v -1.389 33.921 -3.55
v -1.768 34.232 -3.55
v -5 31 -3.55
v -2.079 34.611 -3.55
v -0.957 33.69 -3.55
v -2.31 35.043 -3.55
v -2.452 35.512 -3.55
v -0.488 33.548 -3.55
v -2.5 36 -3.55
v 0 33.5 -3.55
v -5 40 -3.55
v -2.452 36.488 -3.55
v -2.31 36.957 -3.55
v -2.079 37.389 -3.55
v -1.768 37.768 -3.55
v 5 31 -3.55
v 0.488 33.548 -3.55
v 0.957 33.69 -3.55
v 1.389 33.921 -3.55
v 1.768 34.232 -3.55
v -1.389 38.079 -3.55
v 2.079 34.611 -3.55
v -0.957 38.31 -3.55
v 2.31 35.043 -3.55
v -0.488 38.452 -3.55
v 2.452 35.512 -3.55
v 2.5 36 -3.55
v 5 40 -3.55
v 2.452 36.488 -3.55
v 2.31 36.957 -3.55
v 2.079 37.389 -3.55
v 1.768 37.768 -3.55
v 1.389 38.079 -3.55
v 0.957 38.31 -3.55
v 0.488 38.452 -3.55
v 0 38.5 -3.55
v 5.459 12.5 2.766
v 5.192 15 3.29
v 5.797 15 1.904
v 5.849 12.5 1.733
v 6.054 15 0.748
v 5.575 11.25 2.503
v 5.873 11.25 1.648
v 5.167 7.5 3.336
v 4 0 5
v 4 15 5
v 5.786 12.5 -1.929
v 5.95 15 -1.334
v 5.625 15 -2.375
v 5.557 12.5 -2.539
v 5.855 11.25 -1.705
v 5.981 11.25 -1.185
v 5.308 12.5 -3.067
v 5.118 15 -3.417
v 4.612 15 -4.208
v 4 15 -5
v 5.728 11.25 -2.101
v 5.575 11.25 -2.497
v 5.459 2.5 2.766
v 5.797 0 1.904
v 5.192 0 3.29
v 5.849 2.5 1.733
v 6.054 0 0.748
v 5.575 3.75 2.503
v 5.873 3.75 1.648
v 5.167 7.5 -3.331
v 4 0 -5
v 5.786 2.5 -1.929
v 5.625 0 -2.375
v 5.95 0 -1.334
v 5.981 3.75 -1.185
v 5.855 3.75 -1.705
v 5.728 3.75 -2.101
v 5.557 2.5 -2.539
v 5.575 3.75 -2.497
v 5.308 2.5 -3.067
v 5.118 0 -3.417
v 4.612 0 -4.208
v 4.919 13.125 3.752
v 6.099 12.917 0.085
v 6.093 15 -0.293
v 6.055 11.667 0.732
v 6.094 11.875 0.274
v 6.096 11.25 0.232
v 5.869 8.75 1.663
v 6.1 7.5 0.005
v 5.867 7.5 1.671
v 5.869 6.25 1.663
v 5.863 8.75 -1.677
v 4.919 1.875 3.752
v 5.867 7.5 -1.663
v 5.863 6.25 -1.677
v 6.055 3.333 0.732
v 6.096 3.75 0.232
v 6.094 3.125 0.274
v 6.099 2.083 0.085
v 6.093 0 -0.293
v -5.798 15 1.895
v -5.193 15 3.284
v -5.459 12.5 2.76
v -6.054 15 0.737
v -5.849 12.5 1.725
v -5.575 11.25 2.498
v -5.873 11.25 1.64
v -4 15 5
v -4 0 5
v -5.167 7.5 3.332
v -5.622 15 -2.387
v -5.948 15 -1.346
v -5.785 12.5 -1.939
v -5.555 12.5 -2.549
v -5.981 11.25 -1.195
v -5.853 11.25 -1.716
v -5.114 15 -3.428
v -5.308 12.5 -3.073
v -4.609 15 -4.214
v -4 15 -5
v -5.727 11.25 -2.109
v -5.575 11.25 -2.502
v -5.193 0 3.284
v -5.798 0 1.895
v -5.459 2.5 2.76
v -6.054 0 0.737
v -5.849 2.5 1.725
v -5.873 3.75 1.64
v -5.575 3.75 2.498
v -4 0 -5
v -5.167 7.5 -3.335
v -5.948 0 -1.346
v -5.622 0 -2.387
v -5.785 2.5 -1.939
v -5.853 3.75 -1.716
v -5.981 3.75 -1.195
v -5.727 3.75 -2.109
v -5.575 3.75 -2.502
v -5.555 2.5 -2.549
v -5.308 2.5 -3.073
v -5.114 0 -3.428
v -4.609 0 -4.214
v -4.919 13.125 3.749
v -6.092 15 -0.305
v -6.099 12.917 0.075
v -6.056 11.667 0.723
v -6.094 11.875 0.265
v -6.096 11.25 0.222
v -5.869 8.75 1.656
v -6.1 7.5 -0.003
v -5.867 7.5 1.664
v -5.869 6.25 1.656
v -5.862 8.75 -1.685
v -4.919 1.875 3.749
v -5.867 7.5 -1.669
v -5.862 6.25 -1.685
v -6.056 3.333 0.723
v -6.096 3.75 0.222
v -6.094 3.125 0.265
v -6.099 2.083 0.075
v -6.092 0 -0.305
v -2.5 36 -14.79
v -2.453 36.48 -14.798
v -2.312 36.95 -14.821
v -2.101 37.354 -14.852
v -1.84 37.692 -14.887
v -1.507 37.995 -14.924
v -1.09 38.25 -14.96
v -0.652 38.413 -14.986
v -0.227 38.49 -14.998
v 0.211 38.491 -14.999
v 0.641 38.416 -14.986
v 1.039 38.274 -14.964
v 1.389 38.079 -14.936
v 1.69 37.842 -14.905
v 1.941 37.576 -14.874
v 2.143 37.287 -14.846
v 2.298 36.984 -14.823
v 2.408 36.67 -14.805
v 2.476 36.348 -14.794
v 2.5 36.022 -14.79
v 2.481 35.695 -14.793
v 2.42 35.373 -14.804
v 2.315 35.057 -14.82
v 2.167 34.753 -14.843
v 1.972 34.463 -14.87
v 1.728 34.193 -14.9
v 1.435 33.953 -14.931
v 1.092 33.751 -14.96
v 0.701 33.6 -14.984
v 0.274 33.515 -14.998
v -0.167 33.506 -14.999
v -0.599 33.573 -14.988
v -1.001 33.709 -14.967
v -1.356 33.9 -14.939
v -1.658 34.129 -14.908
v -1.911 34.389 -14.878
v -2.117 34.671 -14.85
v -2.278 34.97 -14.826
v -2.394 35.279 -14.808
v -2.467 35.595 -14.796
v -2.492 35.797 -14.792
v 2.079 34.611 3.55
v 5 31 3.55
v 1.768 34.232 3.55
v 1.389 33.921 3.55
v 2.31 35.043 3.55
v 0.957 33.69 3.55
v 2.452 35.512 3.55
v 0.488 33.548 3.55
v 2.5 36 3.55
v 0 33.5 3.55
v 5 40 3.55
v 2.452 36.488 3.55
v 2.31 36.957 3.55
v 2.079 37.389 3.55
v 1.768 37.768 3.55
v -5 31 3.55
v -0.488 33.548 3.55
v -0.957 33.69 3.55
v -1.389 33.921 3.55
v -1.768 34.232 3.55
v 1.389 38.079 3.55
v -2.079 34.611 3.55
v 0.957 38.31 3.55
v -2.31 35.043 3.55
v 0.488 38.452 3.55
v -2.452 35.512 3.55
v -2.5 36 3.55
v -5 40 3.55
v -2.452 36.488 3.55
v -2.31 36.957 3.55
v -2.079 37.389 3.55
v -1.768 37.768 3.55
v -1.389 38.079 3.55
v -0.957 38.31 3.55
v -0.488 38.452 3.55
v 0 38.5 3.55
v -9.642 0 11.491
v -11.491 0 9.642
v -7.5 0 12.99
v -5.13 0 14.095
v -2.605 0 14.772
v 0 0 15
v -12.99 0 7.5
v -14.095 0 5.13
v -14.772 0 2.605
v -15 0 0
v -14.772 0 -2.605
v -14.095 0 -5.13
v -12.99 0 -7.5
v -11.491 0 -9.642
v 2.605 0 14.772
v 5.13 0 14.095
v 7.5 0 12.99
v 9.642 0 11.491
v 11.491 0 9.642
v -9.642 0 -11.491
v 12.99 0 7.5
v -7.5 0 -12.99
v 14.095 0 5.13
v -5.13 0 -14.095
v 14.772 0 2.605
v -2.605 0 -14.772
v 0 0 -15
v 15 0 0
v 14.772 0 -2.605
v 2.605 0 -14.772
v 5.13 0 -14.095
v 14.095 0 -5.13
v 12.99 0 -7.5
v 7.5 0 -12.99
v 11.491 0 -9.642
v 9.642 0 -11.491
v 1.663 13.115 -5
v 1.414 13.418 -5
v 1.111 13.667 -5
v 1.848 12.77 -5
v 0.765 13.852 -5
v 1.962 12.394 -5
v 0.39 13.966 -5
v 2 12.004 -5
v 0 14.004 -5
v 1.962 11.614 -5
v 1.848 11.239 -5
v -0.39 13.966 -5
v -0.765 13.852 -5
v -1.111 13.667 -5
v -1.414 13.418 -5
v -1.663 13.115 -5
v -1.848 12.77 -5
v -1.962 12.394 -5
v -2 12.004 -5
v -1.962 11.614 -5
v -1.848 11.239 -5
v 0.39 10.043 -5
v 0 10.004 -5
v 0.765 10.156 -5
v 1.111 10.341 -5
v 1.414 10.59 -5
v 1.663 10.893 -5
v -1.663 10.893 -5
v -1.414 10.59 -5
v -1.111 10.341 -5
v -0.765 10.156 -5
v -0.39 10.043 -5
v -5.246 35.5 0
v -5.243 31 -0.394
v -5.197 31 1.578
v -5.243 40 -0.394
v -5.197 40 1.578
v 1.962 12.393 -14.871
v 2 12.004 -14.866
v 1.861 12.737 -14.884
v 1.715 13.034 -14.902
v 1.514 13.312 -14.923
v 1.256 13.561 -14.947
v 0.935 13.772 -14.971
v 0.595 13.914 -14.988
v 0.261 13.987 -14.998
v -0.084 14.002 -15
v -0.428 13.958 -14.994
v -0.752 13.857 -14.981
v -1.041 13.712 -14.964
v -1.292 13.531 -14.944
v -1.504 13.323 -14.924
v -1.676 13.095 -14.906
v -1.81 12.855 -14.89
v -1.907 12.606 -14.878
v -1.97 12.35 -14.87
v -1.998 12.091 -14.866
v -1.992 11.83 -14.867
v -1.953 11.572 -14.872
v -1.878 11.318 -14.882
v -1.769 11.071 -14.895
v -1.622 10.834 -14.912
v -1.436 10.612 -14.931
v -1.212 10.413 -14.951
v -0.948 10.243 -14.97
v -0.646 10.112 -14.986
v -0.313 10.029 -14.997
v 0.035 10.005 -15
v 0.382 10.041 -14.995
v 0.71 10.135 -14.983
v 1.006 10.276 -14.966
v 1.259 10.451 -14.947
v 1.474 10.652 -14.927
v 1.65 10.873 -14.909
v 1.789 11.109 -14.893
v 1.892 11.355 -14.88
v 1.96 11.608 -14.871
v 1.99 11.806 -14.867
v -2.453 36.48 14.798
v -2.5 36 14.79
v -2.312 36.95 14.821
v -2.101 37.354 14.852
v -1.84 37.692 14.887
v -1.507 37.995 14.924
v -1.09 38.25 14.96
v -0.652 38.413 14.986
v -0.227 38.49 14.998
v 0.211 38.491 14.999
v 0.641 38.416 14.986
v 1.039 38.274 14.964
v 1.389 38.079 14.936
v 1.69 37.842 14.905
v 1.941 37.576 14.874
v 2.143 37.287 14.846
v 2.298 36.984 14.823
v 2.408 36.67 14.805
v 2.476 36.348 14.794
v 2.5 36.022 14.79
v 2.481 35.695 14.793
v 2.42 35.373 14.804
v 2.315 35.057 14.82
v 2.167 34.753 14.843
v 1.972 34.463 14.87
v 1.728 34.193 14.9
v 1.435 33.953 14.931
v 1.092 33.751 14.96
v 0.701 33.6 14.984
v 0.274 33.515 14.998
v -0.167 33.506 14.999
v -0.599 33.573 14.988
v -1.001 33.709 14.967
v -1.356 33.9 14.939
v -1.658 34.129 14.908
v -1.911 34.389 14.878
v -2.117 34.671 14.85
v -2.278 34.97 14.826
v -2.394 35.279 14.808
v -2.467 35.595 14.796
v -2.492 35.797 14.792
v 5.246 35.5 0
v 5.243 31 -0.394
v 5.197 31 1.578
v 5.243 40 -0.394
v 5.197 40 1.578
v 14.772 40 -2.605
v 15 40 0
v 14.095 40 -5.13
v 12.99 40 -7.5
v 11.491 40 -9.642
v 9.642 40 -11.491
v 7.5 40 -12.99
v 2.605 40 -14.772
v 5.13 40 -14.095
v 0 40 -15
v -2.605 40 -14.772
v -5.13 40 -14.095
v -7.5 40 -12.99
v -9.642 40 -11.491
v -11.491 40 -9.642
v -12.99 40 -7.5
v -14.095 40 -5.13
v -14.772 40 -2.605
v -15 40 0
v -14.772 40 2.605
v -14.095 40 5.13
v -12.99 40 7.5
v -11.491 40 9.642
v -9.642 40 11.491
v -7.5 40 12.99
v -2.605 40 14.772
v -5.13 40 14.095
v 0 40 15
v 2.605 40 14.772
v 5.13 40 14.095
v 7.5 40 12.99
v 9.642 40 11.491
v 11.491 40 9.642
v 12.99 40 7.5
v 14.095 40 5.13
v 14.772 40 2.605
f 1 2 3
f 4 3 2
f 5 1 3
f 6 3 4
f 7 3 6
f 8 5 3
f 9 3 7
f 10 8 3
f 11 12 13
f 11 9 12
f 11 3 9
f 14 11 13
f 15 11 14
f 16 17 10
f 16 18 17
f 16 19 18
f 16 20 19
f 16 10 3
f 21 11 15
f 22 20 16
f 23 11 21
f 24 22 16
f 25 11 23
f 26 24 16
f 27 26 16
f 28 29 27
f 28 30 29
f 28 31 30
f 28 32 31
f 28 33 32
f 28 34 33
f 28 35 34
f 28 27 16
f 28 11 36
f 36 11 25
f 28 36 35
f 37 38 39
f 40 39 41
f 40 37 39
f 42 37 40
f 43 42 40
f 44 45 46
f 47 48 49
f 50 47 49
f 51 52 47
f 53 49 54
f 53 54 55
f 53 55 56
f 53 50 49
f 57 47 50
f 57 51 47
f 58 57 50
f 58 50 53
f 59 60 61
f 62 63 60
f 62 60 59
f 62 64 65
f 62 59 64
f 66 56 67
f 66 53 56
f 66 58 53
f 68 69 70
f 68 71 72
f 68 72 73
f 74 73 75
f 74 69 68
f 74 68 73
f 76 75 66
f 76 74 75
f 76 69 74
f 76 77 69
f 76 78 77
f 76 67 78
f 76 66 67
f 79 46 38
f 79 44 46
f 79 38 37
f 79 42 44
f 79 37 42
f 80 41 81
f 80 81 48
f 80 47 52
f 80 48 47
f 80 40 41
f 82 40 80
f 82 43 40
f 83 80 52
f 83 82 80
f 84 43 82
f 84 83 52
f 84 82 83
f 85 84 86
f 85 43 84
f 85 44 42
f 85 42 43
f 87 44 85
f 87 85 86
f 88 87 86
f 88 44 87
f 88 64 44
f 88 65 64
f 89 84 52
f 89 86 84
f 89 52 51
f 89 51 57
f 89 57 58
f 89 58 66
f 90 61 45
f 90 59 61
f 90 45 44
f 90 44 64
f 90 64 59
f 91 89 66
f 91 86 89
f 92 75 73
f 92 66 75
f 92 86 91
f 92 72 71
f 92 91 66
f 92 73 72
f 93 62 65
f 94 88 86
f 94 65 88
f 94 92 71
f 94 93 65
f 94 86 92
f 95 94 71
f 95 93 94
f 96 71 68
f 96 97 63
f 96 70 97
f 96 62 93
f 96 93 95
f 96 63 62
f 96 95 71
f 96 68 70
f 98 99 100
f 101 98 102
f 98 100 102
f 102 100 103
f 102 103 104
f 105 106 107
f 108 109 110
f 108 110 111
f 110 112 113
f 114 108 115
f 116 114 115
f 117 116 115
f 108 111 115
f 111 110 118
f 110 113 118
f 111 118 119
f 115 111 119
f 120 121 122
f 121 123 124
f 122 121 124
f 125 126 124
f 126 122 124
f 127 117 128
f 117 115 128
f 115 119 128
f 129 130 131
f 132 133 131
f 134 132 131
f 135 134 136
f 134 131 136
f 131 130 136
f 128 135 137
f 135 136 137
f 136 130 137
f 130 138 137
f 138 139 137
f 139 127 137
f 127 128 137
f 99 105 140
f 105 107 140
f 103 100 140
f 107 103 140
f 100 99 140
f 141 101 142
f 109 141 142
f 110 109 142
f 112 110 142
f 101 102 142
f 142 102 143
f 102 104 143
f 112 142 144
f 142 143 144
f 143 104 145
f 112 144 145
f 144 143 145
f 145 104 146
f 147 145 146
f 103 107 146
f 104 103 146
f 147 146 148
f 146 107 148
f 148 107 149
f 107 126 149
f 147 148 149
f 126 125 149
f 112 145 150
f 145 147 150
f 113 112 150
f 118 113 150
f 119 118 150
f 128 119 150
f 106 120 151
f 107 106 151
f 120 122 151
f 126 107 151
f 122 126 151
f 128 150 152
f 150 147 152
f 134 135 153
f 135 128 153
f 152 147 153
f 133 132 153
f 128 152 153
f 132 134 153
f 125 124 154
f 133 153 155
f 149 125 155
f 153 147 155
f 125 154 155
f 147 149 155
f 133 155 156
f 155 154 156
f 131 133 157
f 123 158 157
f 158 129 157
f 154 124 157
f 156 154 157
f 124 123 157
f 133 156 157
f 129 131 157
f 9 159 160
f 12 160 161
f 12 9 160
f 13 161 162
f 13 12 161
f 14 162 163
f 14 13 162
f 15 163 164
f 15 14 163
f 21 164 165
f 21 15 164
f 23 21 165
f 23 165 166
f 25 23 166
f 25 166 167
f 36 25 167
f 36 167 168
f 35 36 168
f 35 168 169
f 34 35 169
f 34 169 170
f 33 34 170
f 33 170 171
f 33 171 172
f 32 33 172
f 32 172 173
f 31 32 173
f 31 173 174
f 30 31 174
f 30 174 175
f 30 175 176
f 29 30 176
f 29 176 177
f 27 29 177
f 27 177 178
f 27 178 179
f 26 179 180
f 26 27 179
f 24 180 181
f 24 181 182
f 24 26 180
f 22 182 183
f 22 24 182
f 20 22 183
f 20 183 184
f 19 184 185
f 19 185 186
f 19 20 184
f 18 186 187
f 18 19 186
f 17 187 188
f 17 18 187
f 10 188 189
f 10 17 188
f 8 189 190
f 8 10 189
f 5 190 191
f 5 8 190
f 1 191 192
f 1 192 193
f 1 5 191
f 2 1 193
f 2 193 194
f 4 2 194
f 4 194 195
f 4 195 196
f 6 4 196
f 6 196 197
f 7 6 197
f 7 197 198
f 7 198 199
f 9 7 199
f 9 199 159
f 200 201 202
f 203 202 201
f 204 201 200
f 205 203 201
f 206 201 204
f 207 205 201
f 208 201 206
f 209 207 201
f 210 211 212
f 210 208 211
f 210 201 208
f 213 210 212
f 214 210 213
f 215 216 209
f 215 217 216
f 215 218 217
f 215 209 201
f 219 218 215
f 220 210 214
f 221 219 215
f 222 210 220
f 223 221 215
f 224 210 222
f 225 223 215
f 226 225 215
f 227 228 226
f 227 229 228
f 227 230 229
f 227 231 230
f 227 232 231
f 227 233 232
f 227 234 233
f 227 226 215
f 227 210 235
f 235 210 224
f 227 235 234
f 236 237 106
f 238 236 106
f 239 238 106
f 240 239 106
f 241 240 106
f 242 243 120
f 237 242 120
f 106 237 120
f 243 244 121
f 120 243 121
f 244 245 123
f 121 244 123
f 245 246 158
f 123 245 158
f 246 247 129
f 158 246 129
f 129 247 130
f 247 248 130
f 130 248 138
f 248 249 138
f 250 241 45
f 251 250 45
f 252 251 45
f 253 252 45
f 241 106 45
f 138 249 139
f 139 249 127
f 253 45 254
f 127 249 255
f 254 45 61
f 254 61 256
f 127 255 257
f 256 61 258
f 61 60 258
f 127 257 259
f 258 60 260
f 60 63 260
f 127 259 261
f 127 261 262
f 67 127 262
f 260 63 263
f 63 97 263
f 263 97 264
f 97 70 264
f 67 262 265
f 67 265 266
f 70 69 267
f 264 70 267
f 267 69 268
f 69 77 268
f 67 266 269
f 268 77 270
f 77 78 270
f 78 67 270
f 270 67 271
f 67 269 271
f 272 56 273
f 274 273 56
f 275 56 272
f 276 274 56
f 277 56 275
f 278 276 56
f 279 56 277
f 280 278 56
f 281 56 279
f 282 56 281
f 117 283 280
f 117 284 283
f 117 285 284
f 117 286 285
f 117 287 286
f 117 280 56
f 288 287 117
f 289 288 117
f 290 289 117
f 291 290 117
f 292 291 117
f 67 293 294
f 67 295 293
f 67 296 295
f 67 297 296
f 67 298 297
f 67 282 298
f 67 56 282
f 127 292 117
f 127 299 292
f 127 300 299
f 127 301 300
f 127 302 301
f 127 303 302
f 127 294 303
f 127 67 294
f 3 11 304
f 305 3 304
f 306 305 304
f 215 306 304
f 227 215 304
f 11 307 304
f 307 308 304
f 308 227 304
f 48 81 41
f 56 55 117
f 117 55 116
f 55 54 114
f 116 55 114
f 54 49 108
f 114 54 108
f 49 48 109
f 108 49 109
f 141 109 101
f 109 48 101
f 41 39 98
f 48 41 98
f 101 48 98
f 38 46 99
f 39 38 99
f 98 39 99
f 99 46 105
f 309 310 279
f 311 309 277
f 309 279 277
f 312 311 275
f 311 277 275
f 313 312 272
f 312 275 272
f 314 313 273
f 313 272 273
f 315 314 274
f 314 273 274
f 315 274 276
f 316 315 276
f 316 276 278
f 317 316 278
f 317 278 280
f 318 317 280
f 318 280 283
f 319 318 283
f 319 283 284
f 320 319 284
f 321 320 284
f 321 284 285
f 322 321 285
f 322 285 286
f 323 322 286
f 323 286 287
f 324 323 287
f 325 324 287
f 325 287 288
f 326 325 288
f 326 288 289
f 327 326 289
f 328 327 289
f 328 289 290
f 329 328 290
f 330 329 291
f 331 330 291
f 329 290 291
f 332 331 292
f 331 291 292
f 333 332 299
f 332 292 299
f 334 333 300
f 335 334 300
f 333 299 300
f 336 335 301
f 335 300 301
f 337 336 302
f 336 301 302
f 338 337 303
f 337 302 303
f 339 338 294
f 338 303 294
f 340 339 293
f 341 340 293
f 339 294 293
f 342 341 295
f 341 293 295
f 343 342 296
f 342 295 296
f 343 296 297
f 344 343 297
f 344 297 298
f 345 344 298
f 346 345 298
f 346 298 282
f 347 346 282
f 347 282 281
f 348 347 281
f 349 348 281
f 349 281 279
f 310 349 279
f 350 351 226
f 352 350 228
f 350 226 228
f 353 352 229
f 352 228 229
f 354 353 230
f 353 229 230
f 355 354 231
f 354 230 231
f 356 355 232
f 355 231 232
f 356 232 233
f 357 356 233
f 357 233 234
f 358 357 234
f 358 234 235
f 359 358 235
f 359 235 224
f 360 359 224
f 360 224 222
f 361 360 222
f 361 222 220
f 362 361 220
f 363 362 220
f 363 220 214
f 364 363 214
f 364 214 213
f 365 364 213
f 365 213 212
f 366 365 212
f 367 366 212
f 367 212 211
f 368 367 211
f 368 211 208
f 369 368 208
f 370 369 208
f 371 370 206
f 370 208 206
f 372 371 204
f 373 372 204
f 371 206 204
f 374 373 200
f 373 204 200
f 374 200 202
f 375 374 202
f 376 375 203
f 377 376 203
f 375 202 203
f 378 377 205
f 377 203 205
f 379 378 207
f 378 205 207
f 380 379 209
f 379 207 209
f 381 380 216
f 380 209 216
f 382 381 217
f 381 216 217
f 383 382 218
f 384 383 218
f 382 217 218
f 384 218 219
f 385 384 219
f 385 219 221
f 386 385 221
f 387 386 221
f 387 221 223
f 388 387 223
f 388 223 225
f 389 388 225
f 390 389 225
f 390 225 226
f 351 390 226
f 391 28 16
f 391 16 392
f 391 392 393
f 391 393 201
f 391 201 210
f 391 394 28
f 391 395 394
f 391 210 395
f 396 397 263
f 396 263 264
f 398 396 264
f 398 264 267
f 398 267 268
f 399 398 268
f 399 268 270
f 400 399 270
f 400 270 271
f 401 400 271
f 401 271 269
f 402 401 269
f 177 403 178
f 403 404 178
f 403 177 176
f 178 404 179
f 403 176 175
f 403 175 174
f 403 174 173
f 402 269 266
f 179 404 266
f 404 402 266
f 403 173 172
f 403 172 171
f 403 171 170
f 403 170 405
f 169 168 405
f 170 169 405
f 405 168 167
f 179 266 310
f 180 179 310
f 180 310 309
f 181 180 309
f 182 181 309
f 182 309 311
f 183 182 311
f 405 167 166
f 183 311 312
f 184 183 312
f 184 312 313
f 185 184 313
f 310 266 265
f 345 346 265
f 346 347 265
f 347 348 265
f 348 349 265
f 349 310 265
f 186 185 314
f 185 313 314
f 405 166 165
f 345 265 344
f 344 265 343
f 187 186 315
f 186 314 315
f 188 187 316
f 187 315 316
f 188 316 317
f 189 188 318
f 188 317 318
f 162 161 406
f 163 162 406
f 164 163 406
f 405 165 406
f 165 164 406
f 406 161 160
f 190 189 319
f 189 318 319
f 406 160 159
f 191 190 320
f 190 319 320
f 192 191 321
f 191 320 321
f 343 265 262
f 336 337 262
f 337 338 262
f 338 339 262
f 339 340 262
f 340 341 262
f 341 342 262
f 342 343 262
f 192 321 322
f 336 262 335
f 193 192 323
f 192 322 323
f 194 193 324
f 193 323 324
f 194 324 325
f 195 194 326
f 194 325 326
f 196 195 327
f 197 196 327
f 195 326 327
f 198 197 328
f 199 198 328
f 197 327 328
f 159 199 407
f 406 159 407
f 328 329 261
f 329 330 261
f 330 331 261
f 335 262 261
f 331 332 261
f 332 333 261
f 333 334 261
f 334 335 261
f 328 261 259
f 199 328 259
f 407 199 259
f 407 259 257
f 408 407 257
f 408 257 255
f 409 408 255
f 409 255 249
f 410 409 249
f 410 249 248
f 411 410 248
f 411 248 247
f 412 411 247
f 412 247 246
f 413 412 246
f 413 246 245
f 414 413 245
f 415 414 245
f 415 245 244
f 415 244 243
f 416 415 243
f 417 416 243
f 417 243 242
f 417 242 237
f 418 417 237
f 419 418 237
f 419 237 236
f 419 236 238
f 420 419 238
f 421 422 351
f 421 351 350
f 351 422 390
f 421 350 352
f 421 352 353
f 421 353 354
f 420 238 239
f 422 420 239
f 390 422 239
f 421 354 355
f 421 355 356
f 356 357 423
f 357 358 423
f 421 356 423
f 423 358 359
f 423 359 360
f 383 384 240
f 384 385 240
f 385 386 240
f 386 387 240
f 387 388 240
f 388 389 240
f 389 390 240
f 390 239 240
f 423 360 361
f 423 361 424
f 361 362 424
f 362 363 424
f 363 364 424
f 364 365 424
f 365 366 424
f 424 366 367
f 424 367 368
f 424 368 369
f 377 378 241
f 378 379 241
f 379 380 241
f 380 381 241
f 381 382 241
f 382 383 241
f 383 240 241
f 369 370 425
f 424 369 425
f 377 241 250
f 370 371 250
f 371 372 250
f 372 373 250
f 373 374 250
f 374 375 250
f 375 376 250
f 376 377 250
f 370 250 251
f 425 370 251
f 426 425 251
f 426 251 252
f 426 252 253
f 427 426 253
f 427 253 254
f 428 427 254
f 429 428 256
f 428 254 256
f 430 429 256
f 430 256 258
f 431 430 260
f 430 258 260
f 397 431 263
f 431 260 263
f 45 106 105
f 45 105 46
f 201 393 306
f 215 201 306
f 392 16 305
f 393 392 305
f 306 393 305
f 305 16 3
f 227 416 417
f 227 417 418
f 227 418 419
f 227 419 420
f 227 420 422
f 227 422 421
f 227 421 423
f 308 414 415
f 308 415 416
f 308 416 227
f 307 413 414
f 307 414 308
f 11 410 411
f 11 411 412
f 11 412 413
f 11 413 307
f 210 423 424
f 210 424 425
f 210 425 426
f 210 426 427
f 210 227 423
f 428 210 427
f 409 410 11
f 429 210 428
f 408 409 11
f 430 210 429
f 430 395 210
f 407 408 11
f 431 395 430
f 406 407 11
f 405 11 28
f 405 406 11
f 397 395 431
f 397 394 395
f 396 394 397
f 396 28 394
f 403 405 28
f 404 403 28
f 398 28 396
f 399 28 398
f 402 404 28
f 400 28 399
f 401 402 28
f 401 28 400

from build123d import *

# Parameters (mm, degrees)
SKETCH1_R               = 15
BOSS_EXTRUDE1_DEPTH     = 40
CUT_EXTRUDE1_DEPTH      = 15
SKETCH3_R               = 2
CUT_EXTRUDE2_DEPTH      = 15
CUT_EXTRUDE3_DEPTH      = 9
SKETCH5_R               = 2.5
CUT_EXTRUDE4_DEPTH      = 19.550000101
CUT_EXTRUDE4_DEPTH_BACK = 12.4500001


with BuildPart() as part:
    # Sketch1 → Boss-Extrude1 (new body)
    with BuildSketch(Plane(origin=(0, 0, 0), x_dir=(1, 0, 0), z_dir=(0, 1, 0))):
        Circle(SKETCH1_R)
    extrude(amount=BOSS_EXTRUDE1_DEPTH)

    # Sketch2 → Cut-Extrude1 (cut)
    with BuildSketch(Plane.XZ):
        with BuildLine():
            Line((-4.000002932, 5), (3.999997068, 5))
            add(Edge.make_bspline(
                [(3.999997068, 5), (8.199974497, 0.009249301), (3.999997068, -5)],
                knots=[0, 0, 0, 1, 1, 1], degree=2))
            Line((3.999997068, -5), (-4.000002932, -5))
            add(Edge.make_bspline(
                [(-4.000002932, 5), (-8.199982148, -0.00561634), (-4.000002932, -5)],
                knots=[0, 0, 0, 1, 1, 1], degree=2))
        make_face()
    extrude(amount=-CUT_EXTRUDE1_DEPTH, mode=Mode.SUBTRACT)

    # Sketch3 → Cut-Extrude2 (cut)
    with BuildSketch(Plane.XY.offset(-5)):
        with Locations((0, 12.004234523)):
            Circle(SKETCH3_R)
    extrude(amount=-CUT_EXTRUDE2_DEPTH, mode=Mode.SUBTRACT)

    # Sketch4 → Cut-Extrude3 (cut)
    with BuildSketch(Plane(origin=(0, 40, 0), x_dir=(1, 0, 0), z_dir=(0, 1, 0))):
        with BuildLine():
            Line((-5, 3.55), (5, 3.55))
            add(Edge.make_bspline(
                [(5, 3.55), (5.491620402, 0), (5, -3.55)],
                knots=[0, 0, 0, 1, 1, 1], degree=2))
            Line((5, -3.55), (-5, -3.55))
            add(Edge.make_bspline(
                [(-5, 3.55), (-5.491620402, 0), (-5, -3.55)],
                knots=[0, 0, 0, 1, 1, 1], degree=2))
        make_face()
    extrude(amount=-CUT_EXTRUDE3_DEPTH, mode=Mode.SUBTRACT)

    # Sketch5 → Cut-Extrude4 (cut, two sides)
    with BuildSketch(Plane(origin=(0, 0, 3.55), x_dir=(-1, 0, 0), z_dir=(0, 0, -1))) as cut_extrude4_sk:
        with Locations((0, 36)):
            Circle(SKETCH5_R)
    extrude(amount=CUT_EXTRUDE4_DEPTH, mode=Mode.SUBTRACT)
    extrude(cut_extrude4_sk.sketch, amount=-CUT_EXTRUDE4_DEPTH_BACK, mode=Mode.SUBTRACT)


solid = part.part
